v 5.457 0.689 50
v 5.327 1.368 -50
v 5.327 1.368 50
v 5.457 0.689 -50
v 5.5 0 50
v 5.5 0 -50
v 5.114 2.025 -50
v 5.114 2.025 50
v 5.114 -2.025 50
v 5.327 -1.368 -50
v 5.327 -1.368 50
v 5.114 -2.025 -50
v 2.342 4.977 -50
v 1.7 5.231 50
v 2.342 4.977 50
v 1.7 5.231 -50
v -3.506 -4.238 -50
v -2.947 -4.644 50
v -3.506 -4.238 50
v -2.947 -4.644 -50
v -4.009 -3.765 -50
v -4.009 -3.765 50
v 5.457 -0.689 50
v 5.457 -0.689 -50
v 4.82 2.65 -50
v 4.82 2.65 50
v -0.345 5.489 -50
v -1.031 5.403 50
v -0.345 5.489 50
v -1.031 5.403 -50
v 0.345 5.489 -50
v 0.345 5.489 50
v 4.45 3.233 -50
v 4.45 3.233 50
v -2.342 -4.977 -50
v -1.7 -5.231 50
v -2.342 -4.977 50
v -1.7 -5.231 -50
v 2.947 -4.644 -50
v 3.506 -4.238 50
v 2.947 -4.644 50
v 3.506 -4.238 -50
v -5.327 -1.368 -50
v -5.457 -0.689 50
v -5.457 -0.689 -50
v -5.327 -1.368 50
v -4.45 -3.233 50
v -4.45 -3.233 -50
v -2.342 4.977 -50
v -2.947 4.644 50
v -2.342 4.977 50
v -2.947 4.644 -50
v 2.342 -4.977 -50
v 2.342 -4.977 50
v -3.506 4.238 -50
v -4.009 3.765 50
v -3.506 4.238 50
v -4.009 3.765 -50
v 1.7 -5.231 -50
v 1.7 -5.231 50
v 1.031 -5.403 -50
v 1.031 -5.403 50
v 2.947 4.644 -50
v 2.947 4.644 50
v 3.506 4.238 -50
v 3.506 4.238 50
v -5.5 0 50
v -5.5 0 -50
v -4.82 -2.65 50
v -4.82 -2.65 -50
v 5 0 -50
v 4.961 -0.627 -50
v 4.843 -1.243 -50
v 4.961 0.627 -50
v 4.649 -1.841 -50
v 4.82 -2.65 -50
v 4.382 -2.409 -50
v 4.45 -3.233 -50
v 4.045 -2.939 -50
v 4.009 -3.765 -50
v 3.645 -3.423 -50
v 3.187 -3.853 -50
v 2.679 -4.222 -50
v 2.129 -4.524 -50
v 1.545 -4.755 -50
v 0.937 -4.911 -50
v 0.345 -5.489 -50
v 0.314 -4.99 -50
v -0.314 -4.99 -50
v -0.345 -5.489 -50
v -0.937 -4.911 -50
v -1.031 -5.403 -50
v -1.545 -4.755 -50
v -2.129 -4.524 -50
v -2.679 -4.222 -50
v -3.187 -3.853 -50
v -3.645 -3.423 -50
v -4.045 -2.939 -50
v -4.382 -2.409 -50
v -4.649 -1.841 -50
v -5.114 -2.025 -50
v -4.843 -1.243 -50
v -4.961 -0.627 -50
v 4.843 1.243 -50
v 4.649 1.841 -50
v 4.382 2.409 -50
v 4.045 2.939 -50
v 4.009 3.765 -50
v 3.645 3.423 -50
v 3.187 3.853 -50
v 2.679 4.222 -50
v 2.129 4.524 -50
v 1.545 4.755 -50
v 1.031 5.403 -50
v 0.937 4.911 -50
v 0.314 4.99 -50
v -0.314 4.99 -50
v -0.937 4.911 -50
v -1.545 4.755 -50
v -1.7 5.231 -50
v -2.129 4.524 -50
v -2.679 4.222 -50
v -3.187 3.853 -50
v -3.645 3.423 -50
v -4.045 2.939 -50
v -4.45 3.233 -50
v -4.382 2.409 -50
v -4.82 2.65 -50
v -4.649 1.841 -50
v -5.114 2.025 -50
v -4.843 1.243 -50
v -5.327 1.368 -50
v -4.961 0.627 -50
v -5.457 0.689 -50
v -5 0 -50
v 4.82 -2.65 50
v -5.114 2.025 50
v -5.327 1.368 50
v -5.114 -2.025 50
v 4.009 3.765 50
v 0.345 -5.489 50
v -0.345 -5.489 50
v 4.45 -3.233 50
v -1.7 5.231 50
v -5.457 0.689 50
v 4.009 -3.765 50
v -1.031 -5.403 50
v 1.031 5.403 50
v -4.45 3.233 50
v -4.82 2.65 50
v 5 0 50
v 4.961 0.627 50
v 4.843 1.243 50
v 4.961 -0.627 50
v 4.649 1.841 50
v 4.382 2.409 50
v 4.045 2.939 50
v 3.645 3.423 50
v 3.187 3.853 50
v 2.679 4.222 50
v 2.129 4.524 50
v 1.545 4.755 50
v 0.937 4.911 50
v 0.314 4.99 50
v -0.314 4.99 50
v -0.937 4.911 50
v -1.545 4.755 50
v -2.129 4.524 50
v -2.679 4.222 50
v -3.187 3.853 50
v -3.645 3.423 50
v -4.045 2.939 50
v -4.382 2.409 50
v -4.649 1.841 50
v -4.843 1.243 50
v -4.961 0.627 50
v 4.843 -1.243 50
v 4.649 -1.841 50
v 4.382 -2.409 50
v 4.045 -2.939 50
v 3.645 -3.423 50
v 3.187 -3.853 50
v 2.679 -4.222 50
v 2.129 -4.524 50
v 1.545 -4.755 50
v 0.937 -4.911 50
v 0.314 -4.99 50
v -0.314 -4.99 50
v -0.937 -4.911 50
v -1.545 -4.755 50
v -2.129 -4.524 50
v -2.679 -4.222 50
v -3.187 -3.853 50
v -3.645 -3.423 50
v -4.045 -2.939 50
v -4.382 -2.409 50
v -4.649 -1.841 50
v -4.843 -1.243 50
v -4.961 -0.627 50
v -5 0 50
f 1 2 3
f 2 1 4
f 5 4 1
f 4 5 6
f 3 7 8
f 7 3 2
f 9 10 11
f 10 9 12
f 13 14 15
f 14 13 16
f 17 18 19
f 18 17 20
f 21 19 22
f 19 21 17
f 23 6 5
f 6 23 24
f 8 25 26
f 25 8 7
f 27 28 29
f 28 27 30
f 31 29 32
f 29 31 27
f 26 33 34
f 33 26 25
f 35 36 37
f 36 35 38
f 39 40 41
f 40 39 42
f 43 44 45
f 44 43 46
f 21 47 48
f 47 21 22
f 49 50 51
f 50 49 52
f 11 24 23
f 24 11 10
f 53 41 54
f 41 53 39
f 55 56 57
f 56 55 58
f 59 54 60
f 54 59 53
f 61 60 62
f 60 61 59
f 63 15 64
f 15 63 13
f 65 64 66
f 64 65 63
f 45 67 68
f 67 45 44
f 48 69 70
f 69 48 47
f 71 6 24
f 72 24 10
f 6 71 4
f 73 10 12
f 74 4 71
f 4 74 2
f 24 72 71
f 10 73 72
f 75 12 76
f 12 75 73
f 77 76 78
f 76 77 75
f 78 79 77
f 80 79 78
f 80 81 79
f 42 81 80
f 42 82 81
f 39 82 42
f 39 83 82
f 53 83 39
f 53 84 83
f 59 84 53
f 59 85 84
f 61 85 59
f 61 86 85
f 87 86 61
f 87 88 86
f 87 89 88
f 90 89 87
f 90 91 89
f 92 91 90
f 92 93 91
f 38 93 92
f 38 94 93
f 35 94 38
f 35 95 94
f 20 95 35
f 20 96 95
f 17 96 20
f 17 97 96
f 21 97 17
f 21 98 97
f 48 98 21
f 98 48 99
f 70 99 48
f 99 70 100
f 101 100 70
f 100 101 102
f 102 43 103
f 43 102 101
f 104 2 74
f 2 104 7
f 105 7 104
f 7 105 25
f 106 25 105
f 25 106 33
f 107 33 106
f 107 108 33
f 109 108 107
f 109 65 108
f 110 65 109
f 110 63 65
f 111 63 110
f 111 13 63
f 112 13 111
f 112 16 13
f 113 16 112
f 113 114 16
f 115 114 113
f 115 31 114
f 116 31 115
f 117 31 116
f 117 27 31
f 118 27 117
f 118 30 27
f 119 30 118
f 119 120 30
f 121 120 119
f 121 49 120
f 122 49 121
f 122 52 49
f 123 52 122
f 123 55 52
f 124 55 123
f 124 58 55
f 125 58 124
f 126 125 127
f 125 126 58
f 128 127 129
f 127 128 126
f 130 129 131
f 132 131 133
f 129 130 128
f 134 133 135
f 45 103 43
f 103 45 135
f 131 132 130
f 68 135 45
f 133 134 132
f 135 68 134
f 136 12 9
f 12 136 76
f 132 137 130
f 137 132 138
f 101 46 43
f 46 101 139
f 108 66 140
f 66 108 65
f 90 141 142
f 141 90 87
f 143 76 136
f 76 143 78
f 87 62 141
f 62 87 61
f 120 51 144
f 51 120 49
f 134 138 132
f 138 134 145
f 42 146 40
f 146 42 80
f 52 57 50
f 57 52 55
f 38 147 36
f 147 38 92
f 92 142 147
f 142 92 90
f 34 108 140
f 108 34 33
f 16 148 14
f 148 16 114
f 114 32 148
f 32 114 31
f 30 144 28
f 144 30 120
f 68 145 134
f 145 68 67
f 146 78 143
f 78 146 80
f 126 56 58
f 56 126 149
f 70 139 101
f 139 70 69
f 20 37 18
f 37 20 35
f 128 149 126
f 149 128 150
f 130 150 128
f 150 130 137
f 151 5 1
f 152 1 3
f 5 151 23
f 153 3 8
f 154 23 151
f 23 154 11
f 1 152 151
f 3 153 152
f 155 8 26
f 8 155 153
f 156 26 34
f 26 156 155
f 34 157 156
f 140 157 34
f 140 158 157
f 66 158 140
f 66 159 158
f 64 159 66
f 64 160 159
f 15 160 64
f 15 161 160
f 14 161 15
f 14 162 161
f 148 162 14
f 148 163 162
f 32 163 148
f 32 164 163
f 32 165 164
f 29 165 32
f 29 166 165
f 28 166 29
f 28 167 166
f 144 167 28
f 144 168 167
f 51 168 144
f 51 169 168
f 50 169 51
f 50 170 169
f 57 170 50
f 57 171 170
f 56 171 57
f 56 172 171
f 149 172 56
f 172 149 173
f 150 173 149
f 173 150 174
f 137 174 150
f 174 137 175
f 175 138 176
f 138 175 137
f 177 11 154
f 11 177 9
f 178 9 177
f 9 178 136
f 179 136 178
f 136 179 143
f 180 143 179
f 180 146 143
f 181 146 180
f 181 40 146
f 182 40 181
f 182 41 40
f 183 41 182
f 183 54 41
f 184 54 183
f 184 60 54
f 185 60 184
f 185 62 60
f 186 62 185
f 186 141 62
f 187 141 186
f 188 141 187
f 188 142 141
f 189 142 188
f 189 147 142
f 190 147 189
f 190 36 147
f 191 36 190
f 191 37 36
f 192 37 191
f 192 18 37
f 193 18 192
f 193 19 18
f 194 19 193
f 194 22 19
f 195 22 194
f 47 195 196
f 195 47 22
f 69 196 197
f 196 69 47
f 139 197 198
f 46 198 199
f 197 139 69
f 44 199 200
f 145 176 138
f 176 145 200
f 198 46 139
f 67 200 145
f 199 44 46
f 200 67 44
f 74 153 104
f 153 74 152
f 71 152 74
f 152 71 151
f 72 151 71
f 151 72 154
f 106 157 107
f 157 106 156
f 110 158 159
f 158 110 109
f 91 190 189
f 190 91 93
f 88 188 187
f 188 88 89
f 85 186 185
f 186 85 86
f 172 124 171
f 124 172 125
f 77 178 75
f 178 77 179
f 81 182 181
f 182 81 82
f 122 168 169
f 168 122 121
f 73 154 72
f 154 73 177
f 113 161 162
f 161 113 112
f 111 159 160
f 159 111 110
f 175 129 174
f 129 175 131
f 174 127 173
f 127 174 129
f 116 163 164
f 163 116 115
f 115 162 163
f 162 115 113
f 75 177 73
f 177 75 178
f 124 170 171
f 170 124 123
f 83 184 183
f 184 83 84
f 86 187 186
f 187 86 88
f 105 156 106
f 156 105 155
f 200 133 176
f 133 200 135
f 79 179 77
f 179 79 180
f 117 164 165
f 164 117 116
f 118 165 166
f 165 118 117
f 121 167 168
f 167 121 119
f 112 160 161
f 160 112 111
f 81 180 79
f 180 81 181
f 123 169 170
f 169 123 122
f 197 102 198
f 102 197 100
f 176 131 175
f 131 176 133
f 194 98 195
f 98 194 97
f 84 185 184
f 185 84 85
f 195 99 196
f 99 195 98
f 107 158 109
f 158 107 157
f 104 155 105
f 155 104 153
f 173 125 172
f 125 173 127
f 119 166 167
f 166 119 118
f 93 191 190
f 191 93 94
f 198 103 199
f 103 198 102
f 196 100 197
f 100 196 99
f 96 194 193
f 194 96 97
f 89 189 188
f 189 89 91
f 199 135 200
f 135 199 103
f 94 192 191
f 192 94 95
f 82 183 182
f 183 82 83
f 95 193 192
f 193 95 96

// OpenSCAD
$fn = 50;


difference() {
	union() {
		translate(v = [0, 0, -50.0000000000]) {
			cylinder(h = 100, r = 5.5000000000);
		}
	}
	union() {
		translate(v = [0, 0, -100.0000000000]) {
			cylinder(h = 200, r = 5.0000000000);
		}
	}
}
